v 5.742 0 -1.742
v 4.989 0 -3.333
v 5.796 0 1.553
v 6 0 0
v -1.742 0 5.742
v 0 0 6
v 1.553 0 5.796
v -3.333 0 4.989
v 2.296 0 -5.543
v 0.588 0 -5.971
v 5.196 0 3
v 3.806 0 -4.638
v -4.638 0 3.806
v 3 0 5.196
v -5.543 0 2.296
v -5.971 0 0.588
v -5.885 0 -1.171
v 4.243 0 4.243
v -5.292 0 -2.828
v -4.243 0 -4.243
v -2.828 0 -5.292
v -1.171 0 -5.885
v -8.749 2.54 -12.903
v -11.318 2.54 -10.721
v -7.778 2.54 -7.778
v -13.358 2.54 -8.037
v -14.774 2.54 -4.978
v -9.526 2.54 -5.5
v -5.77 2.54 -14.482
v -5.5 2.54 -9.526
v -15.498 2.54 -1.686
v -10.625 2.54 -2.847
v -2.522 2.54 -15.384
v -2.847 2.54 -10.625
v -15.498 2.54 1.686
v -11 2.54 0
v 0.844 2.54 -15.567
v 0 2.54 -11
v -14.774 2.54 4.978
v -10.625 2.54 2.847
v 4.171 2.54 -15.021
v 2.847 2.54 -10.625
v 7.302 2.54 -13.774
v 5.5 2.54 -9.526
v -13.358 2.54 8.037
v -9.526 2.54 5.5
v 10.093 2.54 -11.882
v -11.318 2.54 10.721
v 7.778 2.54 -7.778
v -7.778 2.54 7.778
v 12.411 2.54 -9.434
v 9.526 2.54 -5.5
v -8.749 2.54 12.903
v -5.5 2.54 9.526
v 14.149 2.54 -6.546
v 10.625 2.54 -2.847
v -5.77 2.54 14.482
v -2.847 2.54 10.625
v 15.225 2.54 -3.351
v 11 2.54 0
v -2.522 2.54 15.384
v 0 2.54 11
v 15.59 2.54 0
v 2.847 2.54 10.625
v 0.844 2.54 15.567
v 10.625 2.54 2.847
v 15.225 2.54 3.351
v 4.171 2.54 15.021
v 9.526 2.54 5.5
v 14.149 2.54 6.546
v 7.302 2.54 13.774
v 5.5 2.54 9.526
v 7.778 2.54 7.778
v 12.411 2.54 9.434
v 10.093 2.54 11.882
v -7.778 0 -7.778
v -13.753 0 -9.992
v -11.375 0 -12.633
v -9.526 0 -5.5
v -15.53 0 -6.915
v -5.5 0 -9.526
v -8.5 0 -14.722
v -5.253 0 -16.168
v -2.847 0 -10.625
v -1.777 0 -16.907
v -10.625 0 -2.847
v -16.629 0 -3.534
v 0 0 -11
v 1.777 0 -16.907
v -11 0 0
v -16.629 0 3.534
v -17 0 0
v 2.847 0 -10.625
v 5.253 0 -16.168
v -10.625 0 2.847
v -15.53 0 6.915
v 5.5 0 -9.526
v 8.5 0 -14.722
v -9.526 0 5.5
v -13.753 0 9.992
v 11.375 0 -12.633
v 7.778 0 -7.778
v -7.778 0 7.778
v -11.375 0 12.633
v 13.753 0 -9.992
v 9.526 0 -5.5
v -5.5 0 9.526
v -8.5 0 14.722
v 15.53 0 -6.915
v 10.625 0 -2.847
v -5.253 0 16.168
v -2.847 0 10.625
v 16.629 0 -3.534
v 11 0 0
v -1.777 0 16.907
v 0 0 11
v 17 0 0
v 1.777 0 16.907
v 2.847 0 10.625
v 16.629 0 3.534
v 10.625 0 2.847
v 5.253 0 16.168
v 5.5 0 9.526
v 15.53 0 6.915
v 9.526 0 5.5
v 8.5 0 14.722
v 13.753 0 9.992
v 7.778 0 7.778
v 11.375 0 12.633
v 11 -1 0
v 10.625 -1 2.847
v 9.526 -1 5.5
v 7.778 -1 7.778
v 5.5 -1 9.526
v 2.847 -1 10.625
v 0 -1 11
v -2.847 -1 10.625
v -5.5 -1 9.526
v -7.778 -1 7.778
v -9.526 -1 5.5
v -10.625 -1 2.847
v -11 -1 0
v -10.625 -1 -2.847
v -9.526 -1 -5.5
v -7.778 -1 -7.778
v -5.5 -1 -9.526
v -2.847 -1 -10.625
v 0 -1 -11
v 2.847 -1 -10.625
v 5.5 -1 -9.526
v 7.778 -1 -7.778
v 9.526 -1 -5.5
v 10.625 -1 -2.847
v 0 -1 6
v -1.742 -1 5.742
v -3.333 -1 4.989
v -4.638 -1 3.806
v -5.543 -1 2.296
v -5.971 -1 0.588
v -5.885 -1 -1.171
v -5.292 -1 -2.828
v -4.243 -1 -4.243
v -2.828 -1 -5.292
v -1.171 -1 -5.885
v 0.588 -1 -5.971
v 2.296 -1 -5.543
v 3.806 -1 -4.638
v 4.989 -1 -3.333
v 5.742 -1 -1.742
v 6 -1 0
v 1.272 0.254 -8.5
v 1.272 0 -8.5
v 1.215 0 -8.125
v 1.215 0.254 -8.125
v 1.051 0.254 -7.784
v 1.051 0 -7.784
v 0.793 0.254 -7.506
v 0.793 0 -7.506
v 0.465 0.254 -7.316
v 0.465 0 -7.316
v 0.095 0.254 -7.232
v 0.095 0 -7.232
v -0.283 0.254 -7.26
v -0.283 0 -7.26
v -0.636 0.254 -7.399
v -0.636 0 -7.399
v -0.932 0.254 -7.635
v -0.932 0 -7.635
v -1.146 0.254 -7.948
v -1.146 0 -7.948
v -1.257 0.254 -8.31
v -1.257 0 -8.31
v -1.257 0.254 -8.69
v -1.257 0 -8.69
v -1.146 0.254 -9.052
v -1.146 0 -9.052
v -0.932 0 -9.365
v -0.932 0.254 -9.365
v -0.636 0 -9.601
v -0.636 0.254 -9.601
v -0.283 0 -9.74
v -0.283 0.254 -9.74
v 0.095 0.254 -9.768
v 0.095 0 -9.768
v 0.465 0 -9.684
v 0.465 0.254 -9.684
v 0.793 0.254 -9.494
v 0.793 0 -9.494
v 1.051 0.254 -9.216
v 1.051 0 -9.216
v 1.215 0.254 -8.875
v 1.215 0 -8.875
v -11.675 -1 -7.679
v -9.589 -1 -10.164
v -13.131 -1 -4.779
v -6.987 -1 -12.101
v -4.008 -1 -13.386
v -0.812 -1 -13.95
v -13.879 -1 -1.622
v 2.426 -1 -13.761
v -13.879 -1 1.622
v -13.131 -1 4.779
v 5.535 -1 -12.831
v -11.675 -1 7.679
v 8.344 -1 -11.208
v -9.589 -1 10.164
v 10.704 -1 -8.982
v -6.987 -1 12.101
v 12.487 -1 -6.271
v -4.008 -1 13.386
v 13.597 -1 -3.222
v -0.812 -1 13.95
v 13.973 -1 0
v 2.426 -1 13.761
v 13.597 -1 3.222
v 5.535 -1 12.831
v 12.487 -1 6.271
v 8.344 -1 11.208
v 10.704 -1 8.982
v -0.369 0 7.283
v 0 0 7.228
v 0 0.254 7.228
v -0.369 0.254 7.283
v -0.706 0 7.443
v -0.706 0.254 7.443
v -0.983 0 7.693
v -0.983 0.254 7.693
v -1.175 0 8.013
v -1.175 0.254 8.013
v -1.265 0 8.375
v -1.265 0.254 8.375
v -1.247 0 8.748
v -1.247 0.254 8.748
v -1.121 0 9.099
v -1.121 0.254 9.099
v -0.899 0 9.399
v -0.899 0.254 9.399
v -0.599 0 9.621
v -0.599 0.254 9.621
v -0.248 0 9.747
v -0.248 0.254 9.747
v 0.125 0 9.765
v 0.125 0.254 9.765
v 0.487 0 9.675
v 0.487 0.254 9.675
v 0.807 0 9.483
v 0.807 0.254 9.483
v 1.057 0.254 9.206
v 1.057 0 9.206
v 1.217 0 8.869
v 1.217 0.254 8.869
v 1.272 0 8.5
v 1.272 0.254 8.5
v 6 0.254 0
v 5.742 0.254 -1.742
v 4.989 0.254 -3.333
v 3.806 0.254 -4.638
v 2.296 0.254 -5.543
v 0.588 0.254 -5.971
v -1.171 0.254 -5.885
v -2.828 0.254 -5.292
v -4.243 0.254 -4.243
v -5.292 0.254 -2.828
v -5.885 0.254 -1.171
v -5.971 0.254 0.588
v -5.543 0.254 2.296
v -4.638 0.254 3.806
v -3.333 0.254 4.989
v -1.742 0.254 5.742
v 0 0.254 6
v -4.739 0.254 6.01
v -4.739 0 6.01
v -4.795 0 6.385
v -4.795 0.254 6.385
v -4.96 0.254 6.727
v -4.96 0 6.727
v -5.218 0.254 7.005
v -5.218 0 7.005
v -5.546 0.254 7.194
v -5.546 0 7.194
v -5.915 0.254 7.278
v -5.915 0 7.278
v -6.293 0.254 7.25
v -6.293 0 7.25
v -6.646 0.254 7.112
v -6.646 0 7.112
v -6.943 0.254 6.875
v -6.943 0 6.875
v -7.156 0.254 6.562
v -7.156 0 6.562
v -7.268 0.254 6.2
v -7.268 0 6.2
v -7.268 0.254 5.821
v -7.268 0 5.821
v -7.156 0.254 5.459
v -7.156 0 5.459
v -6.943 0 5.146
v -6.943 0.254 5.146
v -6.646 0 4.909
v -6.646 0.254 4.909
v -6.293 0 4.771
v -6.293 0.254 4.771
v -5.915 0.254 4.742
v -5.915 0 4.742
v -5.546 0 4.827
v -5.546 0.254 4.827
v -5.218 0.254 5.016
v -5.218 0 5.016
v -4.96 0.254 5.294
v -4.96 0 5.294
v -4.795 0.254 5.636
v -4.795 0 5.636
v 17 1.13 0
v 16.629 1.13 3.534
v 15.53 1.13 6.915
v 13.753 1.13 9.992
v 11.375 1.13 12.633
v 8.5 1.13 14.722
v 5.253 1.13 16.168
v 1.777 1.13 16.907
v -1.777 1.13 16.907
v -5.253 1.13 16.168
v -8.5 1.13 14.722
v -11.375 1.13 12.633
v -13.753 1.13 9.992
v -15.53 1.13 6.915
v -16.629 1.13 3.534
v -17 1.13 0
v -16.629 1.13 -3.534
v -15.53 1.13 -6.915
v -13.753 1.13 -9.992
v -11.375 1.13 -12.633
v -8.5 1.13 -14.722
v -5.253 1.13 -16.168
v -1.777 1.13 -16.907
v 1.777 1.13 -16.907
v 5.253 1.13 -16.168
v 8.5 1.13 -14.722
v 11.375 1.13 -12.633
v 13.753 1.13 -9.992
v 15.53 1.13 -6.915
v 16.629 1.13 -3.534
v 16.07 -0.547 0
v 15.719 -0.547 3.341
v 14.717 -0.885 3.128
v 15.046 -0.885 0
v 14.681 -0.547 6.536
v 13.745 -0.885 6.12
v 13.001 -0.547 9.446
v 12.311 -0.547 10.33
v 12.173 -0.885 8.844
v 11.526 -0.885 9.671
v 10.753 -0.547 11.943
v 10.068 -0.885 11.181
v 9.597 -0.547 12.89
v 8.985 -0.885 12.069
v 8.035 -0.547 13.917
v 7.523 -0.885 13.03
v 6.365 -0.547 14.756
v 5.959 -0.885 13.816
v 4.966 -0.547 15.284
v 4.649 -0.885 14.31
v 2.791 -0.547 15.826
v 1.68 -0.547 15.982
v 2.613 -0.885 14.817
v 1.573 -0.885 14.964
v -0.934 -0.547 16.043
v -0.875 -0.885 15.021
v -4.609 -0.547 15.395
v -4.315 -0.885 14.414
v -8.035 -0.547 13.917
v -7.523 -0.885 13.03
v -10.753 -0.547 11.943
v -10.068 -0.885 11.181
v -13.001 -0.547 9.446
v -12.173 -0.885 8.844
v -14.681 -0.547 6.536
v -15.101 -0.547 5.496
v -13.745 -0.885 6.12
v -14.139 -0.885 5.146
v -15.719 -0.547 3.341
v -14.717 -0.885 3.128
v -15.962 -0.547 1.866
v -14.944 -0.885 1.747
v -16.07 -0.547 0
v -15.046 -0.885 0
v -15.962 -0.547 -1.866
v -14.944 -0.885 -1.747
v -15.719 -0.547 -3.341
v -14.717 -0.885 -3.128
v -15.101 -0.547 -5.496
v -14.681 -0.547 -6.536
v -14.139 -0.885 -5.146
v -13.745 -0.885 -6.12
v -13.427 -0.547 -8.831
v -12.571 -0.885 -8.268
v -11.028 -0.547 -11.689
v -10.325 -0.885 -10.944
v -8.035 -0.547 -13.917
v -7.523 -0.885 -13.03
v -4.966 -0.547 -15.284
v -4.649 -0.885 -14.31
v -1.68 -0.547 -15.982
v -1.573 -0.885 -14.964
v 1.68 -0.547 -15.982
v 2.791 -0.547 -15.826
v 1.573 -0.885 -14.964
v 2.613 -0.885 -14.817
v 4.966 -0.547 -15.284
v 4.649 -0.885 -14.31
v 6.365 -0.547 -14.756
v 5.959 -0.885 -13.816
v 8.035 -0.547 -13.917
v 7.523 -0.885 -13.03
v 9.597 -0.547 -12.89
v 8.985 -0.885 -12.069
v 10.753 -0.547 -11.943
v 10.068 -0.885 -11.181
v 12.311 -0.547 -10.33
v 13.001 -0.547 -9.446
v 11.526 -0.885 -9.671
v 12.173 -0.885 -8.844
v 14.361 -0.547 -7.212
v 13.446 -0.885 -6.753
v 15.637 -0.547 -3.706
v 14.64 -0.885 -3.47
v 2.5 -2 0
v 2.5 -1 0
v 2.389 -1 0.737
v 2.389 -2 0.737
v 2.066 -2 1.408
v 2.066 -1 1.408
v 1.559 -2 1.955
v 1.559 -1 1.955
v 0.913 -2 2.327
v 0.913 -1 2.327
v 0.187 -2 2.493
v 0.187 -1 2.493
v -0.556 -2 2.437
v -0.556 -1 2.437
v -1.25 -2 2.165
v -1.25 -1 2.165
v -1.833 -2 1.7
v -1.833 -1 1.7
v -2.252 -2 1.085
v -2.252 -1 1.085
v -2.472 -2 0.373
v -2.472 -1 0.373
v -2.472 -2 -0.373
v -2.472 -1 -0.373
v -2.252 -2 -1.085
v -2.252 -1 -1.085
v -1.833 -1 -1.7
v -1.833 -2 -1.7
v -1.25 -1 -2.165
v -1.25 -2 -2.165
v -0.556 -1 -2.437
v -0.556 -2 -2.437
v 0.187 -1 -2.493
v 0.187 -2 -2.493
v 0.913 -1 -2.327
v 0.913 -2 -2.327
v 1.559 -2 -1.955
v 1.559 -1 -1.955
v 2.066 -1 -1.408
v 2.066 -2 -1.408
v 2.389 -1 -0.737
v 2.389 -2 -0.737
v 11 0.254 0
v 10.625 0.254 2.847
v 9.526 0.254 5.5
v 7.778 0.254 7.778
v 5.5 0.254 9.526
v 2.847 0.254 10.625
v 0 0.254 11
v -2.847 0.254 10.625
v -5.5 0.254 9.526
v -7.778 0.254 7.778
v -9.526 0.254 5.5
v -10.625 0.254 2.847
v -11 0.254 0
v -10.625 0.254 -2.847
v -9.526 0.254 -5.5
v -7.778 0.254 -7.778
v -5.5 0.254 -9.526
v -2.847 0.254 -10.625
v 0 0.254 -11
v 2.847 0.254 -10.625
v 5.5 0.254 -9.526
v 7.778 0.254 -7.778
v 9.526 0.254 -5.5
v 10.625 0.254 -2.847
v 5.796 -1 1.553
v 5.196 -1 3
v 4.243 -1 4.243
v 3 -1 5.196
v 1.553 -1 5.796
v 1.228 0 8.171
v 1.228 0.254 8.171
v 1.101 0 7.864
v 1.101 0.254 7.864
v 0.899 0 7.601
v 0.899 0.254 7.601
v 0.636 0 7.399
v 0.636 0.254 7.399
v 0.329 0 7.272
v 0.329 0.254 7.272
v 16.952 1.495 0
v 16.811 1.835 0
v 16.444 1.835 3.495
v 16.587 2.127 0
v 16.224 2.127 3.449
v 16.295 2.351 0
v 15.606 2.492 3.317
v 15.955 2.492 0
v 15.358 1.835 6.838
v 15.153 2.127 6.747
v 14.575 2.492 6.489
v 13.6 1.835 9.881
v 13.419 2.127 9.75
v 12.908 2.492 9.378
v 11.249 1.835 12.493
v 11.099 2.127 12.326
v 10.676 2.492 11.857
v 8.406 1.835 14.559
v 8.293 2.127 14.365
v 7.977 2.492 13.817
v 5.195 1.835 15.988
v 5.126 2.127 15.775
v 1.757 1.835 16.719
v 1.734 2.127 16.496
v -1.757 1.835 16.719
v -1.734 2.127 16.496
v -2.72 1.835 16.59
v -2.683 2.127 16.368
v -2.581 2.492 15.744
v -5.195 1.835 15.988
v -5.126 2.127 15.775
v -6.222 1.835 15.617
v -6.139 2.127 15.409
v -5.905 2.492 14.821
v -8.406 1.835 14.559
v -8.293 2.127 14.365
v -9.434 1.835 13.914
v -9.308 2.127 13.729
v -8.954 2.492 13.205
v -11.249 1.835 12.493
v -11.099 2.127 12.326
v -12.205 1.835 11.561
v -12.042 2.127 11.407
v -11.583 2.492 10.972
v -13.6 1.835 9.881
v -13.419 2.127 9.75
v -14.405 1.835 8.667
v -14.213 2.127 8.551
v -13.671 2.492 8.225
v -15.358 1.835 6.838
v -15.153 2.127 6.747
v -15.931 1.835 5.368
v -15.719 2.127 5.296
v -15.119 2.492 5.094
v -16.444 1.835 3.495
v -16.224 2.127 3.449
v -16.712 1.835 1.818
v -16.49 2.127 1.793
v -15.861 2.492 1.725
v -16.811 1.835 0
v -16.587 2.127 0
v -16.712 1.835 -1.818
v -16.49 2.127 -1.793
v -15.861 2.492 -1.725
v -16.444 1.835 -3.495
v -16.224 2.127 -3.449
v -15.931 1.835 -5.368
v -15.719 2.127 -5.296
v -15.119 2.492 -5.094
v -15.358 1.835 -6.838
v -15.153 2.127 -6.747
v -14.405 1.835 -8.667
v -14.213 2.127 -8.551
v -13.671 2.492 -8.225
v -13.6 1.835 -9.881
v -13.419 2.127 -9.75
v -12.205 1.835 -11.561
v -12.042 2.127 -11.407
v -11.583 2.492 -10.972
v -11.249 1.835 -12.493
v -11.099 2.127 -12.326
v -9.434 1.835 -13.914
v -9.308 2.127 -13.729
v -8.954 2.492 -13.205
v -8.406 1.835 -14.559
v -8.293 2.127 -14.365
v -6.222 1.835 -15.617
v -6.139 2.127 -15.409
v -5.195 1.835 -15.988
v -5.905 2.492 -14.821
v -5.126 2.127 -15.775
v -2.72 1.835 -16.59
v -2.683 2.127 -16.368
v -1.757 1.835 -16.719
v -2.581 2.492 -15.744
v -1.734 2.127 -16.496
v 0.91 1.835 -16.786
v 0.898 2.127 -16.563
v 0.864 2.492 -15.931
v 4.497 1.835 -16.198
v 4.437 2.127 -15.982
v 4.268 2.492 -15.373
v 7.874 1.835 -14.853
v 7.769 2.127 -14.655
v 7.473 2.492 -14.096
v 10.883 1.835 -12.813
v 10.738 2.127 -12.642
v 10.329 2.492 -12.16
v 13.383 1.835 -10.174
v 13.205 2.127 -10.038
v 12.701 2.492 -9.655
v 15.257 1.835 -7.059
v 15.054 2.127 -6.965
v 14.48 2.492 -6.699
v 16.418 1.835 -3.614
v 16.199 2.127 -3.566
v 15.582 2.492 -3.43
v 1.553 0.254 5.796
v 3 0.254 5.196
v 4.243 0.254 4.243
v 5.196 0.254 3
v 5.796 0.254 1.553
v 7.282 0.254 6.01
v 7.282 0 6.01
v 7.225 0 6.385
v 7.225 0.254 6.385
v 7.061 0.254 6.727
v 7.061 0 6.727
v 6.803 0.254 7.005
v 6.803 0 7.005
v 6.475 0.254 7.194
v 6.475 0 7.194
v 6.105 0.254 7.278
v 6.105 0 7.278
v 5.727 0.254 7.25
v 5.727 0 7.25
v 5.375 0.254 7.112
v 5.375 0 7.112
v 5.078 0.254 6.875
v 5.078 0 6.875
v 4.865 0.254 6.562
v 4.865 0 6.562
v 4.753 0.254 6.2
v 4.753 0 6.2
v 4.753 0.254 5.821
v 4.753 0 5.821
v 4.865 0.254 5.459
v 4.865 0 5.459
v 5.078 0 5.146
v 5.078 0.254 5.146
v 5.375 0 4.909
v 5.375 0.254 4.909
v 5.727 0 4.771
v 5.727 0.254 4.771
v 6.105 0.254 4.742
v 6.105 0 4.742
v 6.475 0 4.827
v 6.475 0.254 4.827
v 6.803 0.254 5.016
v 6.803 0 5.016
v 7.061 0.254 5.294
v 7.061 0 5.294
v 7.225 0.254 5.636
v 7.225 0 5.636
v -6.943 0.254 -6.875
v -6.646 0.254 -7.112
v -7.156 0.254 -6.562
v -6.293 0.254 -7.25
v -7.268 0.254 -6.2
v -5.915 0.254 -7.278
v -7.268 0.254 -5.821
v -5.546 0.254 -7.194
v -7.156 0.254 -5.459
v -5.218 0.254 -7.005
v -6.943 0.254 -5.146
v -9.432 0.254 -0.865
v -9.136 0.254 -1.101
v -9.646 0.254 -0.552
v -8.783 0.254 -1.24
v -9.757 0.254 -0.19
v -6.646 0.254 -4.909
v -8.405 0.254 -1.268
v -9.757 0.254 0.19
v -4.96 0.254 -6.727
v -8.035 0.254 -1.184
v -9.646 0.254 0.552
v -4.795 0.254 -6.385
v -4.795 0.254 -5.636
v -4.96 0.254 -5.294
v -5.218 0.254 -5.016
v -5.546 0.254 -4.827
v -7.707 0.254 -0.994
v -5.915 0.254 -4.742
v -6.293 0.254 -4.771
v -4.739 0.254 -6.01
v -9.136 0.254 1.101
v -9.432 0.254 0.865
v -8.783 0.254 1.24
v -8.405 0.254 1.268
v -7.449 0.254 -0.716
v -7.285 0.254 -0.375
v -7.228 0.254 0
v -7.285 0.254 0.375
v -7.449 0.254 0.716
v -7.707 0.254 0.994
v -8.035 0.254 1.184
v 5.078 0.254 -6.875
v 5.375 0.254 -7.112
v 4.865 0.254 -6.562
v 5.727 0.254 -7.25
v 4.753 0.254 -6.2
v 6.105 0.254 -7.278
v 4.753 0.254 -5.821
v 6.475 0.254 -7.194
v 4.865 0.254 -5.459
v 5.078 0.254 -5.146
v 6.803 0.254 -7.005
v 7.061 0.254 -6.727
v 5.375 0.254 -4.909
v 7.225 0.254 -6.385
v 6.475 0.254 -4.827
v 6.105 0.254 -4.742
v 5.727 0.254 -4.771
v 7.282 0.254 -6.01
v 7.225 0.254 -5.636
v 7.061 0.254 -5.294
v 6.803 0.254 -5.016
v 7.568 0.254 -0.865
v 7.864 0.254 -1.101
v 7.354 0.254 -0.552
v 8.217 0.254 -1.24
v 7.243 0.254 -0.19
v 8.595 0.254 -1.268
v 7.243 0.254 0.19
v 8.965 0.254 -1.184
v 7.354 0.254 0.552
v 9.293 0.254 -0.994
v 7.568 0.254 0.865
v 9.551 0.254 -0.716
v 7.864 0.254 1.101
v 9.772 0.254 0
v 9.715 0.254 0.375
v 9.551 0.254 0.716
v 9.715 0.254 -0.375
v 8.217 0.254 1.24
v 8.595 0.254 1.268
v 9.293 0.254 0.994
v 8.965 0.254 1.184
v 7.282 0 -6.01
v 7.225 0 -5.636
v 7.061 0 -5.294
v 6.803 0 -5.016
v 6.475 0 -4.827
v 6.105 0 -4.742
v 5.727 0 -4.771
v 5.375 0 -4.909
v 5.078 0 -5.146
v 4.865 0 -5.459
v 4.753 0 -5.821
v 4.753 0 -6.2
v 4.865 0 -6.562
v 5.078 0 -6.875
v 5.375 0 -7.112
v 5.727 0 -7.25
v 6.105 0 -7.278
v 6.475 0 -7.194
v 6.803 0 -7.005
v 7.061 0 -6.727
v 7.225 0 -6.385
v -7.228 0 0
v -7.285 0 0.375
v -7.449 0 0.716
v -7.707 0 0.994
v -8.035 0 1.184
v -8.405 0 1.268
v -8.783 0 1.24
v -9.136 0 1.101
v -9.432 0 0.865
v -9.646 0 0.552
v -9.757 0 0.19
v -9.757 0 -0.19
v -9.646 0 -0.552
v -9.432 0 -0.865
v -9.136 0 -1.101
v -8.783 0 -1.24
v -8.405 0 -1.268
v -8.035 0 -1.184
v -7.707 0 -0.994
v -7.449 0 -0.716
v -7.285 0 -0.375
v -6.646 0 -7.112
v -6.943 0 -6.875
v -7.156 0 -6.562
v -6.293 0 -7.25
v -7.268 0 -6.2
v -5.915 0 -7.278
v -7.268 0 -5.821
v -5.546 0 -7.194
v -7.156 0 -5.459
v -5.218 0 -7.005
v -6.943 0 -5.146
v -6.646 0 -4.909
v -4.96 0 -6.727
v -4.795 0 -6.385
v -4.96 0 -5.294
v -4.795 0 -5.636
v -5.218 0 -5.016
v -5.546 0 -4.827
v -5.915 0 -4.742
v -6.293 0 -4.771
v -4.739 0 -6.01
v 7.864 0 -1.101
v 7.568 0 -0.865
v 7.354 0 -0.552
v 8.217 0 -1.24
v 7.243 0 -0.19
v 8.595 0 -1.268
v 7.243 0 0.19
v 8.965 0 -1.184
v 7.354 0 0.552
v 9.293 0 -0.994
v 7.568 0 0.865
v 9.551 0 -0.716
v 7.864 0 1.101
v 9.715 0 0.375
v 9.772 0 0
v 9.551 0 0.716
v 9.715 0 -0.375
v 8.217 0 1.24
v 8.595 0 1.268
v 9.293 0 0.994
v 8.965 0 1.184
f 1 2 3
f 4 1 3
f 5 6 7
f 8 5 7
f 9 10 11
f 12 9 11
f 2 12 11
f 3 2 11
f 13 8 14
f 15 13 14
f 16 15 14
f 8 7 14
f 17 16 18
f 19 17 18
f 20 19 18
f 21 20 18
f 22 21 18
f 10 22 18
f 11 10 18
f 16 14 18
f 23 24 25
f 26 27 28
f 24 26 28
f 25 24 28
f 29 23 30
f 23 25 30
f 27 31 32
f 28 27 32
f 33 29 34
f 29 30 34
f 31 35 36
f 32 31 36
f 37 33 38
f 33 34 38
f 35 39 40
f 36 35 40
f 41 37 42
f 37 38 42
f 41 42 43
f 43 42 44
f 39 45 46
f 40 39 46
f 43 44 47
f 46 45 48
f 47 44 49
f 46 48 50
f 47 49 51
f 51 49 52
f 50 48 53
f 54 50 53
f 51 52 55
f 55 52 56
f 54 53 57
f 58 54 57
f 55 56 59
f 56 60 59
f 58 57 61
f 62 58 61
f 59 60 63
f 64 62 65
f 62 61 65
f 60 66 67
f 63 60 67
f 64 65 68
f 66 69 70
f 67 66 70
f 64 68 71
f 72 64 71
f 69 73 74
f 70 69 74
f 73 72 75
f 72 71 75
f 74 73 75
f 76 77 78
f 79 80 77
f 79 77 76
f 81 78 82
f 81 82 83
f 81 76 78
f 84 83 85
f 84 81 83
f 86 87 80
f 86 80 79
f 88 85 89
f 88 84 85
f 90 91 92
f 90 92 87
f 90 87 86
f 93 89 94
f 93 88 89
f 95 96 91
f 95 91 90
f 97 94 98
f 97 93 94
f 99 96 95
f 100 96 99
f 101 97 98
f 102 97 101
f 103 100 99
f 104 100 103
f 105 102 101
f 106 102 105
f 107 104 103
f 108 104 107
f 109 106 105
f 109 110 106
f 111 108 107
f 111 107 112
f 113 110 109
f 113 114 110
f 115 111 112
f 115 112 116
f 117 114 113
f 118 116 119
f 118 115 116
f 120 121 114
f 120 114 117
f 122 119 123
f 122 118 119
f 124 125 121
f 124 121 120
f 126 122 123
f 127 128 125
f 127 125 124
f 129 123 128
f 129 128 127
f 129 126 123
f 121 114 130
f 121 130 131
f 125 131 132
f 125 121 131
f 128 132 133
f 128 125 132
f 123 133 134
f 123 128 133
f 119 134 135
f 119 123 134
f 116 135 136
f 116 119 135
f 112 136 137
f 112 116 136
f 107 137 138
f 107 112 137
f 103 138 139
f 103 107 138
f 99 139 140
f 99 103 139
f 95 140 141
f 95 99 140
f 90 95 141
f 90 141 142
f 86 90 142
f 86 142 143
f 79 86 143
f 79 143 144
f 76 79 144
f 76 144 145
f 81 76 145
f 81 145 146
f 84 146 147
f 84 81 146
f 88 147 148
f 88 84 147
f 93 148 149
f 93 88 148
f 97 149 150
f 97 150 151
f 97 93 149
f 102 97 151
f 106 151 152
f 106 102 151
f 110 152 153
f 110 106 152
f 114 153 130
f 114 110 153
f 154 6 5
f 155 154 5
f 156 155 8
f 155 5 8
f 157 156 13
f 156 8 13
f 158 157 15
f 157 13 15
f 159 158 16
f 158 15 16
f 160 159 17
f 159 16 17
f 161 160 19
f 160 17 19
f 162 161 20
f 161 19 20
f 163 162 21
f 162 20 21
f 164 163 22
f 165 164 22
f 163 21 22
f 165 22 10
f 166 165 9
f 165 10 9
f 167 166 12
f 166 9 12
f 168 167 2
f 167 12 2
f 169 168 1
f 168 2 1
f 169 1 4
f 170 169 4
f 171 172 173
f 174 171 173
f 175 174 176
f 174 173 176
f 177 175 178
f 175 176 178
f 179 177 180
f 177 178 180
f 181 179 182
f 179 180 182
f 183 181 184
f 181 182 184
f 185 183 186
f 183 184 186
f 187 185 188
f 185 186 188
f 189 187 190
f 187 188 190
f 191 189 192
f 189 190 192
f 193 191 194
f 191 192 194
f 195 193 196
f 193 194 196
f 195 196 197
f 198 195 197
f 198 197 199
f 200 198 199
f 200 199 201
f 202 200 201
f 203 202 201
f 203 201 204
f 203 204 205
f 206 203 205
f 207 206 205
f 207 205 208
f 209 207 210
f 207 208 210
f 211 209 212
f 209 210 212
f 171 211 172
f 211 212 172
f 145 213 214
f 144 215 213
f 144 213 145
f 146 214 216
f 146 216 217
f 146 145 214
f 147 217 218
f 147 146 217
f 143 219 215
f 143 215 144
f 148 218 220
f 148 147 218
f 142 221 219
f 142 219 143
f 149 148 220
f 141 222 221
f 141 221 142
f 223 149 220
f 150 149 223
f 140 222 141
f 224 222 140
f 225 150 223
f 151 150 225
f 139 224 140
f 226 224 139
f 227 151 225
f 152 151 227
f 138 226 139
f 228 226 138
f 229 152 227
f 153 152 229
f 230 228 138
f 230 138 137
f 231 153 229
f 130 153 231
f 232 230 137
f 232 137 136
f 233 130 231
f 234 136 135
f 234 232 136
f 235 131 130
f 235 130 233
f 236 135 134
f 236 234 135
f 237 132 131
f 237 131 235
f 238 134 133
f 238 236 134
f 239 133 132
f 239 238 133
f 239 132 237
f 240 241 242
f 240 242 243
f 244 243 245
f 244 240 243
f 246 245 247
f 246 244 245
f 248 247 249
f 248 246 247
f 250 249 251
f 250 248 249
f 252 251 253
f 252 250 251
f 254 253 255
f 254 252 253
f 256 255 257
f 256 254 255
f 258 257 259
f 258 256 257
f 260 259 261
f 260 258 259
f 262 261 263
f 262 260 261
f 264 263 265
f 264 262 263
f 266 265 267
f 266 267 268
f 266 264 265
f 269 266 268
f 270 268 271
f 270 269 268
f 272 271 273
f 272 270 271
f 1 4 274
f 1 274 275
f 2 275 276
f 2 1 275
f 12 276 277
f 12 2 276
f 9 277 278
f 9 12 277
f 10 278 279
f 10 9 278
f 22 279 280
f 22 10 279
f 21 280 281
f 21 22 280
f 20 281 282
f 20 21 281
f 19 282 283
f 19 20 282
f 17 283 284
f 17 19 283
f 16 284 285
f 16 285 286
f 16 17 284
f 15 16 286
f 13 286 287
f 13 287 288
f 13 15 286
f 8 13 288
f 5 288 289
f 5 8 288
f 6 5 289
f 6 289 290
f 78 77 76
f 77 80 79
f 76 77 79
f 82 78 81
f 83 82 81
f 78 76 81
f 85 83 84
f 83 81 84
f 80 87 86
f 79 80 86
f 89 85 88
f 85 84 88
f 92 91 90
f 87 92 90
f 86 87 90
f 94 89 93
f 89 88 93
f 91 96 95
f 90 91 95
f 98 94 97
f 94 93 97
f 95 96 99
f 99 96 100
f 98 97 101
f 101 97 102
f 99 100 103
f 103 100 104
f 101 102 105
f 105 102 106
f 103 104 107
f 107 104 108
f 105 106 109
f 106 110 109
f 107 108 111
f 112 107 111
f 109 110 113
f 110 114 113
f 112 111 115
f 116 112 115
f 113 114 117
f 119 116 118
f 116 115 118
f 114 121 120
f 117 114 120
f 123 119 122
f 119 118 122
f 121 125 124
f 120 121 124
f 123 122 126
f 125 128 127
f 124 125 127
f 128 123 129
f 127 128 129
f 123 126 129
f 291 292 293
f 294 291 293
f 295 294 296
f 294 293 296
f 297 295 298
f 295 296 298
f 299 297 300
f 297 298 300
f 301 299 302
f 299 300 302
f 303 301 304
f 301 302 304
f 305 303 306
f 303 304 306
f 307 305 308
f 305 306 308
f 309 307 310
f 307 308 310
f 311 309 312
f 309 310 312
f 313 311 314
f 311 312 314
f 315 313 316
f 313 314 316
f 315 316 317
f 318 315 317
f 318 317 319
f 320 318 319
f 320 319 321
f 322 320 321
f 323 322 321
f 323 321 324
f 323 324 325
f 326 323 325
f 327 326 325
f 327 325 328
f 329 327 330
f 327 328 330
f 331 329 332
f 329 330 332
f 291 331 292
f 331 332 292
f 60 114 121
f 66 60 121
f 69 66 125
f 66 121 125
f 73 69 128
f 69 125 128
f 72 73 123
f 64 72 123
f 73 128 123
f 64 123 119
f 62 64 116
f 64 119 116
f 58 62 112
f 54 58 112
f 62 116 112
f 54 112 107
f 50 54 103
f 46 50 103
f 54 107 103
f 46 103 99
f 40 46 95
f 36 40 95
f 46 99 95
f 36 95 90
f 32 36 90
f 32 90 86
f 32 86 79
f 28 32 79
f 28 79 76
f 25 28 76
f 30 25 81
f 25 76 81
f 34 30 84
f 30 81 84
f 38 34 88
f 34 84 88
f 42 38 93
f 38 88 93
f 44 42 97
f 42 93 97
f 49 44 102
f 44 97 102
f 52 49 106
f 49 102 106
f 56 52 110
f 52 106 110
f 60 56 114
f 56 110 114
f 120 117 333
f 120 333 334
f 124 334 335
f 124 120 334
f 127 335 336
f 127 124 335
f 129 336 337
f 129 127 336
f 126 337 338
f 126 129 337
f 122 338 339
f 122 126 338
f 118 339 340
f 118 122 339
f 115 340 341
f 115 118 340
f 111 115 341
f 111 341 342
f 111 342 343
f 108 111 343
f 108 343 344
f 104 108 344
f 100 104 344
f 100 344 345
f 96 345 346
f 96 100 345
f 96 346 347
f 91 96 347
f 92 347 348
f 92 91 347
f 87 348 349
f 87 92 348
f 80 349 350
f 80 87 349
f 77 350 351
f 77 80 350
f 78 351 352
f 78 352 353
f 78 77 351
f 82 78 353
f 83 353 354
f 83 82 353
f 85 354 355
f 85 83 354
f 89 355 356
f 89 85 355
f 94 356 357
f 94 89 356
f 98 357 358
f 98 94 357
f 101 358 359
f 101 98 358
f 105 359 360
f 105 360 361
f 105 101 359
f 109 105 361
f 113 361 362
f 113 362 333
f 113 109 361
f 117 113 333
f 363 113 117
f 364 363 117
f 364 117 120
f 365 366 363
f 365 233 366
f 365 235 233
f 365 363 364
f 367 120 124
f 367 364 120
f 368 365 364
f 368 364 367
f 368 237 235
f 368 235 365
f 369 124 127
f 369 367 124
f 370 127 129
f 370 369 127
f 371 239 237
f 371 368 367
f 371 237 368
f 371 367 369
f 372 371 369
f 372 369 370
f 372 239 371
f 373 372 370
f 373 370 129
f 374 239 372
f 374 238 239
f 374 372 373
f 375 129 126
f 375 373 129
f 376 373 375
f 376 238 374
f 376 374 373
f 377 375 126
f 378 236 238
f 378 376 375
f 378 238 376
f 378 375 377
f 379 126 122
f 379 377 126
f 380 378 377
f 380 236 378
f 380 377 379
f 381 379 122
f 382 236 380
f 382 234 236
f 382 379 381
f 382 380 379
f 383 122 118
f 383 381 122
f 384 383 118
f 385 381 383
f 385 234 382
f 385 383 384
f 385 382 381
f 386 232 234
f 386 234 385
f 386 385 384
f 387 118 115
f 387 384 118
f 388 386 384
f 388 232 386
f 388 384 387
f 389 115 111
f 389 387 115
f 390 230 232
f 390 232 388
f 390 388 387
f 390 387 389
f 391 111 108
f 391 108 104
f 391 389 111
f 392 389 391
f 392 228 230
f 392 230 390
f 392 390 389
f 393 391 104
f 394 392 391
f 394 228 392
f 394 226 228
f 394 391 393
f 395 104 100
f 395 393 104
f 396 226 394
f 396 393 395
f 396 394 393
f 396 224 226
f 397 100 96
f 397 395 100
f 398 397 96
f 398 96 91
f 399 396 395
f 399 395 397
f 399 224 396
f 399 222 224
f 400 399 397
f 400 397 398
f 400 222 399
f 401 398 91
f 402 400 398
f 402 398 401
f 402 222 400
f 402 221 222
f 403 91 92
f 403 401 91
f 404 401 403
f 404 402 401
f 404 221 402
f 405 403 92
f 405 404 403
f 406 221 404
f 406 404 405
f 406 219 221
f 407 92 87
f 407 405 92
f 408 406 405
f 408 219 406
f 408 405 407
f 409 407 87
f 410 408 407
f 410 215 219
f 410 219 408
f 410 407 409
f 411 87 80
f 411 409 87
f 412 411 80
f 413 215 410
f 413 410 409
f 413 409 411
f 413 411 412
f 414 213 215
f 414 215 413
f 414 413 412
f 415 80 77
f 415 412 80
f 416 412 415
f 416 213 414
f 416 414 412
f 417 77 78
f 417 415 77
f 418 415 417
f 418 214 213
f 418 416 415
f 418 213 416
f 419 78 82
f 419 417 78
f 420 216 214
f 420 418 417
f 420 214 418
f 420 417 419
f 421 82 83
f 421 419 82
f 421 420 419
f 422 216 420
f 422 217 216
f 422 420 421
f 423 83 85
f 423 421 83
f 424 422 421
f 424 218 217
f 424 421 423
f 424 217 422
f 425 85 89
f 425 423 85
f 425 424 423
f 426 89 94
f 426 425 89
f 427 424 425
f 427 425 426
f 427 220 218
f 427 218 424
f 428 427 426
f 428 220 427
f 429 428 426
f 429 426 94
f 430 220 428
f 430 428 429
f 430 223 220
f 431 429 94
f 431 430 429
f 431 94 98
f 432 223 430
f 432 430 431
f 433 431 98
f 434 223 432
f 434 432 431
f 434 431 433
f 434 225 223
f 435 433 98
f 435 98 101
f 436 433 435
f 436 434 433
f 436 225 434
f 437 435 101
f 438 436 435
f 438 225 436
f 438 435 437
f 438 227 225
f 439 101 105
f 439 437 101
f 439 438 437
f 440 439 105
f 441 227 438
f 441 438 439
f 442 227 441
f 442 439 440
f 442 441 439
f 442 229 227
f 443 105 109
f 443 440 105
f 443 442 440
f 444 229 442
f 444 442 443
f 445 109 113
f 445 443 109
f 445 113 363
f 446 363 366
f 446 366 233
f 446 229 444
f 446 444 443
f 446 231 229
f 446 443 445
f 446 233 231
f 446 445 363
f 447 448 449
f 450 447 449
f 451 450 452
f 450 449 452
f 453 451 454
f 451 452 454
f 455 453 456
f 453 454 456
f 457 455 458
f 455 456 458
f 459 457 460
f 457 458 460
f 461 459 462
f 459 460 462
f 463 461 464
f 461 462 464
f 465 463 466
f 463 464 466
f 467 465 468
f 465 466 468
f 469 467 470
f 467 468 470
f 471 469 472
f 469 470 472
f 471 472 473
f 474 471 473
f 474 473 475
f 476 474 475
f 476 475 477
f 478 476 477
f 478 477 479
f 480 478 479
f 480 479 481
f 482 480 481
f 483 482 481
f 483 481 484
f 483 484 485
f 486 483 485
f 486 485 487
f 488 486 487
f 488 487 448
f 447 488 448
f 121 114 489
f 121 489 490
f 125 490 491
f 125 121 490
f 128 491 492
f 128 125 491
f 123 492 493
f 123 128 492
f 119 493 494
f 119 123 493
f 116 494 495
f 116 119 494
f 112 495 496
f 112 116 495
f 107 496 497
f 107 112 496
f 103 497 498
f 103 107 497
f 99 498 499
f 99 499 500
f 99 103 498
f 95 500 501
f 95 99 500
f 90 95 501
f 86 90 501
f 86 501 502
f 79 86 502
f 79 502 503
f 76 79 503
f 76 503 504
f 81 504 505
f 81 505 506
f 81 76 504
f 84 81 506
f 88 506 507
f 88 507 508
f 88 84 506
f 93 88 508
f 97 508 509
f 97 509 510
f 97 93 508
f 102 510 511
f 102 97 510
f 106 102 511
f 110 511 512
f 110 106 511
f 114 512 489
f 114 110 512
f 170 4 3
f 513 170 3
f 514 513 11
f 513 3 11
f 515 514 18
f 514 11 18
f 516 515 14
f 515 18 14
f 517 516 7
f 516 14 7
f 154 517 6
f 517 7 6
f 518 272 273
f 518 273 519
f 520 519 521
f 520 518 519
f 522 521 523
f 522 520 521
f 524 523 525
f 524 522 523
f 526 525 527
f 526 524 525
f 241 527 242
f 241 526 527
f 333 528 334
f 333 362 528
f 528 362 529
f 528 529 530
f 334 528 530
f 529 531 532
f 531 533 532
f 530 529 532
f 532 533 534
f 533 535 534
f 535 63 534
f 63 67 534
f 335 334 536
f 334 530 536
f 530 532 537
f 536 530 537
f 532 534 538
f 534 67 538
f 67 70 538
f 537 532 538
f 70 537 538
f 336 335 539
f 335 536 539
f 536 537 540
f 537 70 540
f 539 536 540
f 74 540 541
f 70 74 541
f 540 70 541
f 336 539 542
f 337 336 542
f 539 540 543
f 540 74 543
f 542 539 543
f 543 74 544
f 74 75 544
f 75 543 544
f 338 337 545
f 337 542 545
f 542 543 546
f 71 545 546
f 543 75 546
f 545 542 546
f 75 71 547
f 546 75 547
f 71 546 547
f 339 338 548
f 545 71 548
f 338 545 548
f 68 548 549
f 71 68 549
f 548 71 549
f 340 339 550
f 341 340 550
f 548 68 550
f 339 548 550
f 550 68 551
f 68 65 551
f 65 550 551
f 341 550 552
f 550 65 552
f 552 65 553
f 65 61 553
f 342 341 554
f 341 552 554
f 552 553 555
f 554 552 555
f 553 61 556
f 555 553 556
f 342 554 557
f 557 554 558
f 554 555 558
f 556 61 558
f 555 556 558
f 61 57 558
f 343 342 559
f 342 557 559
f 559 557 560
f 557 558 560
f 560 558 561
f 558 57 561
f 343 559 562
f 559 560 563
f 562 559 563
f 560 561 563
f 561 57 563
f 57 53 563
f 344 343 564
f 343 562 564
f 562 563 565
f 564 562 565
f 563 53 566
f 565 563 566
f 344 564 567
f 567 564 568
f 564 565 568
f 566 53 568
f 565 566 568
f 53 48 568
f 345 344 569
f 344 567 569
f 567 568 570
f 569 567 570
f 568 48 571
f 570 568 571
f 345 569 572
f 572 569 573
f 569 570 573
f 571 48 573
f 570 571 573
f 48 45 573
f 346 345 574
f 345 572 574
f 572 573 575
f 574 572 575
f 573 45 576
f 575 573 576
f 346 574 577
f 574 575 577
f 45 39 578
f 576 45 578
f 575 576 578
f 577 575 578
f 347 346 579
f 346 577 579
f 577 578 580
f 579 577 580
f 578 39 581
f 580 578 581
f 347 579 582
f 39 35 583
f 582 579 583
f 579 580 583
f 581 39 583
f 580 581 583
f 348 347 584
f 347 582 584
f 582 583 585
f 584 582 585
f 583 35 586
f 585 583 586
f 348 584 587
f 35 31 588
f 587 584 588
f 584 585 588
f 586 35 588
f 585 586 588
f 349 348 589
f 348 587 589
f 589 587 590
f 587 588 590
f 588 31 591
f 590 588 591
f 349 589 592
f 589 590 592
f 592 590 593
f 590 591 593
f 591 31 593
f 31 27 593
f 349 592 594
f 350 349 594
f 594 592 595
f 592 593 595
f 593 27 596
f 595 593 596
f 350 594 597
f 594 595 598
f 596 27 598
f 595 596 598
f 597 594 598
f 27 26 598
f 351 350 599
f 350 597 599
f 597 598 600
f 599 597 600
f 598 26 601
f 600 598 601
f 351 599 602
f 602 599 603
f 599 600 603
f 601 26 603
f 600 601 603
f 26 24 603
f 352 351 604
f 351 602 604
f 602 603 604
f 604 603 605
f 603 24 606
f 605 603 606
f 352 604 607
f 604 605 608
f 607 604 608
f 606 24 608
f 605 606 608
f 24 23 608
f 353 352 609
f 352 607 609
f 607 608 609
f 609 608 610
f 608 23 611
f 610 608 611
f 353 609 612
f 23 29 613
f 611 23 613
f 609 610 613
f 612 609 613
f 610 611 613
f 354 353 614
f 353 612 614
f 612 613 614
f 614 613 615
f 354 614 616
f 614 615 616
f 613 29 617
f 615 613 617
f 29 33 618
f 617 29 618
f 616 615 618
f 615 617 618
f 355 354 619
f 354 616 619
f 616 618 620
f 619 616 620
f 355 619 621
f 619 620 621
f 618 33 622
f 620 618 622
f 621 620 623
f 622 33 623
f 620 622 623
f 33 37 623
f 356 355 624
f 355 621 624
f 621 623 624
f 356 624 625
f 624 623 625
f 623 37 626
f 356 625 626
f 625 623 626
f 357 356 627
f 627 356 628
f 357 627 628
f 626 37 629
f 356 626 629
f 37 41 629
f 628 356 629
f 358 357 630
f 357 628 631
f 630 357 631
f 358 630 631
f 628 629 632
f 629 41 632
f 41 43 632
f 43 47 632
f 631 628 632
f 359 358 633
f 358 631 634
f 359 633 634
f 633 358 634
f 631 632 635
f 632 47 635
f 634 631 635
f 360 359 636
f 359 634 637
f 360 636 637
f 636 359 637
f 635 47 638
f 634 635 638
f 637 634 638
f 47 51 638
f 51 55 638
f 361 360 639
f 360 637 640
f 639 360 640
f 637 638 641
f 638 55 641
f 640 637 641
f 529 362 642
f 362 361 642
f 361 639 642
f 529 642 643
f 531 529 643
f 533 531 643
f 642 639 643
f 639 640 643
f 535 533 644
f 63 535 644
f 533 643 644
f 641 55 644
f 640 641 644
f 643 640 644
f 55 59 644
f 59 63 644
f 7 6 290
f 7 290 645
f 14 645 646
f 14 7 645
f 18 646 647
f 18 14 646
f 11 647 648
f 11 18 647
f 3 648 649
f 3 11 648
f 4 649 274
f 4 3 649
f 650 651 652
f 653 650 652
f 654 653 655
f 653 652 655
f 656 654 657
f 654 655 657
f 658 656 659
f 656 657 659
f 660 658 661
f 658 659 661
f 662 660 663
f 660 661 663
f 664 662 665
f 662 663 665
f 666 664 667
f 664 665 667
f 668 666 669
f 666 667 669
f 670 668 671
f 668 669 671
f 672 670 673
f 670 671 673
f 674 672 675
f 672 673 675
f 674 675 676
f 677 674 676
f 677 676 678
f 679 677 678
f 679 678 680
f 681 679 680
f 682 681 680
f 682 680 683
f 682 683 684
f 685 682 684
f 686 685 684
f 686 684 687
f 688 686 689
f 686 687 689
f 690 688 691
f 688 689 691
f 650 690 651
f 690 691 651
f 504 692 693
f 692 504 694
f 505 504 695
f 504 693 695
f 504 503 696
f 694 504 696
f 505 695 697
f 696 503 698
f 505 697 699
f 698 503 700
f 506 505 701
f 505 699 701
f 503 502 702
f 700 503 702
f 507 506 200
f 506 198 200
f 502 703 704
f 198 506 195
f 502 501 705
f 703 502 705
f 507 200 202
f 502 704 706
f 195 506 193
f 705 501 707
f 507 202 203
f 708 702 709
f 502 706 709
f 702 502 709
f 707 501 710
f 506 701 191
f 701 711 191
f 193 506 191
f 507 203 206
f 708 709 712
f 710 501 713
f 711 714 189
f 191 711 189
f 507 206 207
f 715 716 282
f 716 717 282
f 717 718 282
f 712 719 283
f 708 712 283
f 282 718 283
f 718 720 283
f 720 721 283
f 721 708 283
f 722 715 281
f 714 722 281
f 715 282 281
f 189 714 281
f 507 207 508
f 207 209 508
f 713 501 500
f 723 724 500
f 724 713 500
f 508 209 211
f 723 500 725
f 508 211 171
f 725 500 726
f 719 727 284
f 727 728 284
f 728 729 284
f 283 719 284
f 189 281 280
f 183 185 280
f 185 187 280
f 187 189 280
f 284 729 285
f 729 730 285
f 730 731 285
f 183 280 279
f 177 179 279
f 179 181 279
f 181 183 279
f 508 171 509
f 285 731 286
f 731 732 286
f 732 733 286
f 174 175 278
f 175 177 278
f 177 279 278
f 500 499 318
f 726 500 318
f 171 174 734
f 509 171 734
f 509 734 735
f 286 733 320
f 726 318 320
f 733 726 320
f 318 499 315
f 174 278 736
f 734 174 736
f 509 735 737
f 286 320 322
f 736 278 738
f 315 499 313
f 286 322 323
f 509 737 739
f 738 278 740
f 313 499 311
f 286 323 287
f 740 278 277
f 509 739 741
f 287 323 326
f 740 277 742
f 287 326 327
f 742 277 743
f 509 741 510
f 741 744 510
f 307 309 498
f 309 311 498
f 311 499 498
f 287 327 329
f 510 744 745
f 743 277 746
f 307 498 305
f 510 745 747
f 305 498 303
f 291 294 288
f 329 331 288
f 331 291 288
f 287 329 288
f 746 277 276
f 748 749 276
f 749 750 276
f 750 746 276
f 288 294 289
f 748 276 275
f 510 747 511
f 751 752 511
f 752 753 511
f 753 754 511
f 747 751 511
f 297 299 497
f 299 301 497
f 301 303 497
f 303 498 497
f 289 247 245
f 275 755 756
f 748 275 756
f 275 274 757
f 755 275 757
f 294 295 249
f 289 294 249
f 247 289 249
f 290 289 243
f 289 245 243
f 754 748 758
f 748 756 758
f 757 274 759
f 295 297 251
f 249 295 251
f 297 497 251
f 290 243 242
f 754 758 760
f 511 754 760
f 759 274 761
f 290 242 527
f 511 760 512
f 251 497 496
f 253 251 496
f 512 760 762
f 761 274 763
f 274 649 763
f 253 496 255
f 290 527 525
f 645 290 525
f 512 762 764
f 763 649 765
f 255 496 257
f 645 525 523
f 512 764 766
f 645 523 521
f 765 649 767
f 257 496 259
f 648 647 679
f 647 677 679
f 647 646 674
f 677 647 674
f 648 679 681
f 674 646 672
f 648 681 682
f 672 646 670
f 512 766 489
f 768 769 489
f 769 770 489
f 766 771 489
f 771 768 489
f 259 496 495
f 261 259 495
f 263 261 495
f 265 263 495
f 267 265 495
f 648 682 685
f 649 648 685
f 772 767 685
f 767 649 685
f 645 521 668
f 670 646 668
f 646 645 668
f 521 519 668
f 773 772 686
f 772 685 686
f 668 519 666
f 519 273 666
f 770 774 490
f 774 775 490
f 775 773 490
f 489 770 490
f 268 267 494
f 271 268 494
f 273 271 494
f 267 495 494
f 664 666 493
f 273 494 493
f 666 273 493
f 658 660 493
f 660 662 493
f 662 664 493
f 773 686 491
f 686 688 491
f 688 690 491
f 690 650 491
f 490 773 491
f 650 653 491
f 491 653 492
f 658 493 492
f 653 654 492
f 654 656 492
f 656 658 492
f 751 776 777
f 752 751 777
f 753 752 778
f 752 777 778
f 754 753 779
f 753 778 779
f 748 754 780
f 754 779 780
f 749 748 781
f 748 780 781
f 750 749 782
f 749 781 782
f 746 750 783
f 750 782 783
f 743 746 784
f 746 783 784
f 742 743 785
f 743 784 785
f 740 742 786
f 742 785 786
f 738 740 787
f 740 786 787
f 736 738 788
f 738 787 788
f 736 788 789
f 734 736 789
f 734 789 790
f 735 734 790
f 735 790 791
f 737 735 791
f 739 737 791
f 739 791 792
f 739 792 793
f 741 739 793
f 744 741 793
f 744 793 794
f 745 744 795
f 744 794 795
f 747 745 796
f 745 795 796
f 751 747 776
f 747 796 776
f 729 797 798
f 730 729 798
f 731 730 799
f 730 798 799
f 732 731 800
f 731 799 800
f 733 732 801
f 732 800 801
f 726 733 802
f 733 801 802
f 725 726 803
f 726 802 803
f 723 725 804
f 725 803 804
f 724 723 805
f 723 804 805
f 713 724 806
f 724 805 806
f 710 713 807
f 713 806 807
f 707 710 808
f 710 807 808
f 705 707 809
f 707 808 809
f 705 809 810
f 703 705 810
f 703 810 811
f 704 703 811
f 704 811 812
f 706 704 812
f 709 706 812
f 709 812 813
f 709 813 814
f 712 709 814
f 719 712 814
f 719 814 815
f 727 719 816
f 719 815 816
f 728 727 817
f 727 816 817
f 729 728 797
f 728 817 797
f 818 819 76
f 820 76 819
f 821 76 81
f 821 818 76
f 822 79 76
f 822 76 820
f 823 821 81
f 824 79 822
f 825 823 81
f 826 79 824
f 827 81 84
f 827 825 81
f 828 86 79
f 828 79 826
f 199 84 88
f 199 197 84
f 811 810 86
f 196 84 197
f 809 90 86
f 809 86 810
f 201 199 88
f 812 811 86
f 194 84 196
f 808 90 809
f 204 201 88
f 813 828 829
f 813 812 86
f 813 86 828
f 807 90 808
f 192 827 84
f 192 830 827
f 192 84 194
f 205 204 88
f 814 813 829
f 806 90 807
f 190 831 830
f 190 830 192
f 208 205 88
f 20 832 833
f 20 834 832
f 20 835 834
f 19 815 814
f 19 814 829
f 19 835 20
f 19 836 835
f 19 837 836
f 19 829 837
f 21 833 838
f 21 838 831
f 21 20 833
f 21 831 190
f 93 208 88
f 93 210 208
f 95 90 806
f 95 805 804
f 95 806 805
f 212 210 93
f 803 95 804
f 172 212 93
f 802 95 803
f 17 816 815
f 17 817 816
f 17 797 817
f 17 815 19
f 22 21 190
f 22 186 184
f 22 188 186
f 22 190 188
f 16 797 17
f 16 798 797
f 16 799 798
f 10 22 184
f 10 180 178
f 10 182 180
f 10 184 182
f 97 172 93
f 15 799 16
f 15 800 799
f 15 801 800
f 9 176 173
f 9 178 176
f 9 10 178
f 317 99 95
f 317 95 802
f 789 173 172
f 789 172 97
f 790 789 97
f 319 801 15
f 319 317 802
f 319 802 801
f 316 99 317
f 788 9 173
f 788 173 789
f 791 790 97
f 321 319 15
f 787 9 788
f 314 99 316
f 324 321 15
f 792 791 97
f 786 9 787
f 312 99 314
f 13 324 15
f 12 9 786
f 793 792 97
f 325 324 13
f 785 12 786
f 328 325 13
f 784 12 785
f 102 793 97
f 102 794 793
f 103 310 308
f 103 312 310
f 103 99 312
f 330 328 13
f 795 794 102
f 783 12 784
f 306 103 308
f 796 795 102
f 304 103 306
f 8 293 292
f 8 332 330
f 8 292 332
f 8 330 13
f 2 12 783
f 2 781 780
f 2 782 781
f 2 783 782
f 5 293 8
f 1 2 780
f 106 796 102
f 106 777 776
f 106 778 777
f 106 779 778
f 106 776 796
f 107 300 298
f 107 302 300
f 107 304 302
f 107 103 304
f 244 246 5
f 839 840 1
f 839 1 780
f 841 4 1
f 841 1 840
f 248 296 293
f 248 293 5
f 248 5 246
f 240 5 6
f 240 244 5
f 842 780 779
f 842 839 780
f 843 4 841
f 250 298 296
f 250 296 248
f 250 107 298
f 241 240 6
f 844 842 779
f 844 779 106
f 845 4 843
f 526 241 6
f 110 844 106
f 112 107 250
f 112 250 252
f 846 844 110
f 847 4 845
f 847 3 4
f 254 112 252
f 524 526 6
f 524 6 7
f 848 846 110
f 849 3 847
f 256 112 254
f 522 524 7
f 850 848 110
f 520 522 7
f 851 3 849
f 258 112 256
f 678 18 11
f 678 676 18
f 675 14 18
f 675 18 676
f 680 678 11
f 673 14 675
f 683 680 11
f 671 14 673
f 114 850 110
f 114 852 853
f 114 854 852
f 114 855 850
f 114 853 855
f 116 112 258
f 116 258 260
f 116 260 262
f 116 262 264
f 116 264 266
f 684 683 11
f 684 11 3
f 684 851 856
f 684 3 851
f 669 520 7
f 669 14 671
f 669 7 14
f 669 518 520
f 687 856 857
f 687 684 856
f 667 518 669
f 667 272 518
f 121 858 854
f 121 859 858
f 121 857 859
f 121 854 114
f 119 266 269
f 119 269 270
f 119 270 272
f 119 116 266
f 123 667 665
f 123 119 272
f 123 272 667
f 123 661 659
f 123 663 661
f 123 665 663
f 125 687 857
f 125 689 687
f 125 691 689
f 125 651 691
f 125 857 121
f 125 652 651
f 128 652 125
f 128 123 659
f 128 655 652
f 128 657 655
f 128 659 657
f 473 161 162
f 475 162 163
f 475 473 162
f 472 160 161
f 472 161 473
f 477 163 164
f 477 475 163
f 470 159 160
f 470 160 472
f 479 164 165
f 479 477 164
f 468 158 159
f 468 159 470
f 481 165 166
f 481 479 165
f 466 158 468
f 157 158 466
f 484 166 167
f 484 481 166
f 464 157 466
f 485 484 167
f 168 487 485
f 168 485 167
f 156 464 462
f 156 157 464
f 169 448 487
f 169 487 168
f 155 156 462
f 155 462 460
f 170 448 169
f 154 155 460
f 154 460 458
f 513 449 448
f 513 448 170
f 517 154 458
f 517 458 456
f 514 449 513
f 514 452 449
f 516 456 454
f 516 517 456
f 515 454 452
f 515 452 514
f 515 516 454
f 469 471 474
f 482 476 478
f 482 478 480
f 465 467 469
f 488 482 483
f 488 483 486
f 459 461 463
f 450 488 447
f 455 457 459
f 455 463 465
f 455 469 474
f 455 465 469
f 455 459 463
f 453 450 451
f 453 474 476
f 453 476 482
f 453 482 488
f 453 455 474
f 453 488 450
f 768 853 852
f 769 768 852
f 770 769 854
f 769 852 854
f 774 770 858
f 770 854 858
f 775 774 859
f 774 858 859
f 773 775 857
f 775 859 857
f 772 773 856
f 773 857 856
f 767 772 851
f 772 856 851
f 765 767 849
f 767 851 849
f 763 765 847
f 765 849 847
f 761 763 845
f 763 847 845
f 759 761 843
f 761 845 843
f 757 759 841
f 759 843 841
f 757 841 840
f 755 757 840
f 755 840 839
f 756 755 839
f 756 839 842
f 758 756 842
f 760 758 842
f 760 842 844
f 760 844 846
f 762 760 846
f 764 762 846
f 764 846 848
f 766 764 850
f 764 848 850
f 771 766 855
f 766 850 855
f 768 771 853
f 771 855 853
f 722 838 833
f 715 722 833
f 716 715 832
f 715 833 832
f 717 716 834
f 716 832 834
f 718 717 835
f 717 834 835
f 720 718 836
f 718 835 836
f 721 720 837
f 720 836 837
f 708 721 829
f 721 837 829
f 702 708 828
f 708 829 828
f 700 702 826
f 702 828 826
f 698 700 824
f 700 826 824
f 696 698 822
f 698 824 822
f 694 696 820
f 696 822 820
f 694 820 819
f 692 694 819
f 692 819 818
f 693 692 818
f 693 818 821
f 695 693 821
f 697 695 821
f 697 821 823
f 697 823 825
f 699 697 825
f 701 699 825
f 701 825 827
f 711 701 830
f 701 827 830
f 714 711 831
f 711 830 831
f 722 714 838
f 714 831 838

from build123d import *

# Parameters (mm, degrees)
F1_R     = 17
F1_R_2   = 11
F2_DEPTH = 1
F1_R_3   = 2.5
F3_DEPTH = 2
F1_R_4   = 1.2715293898
F4_DEPTH = 0.254
F6_DEPTH = 2.54
F7_R     = 1.4103835631


# Not quite as in the source:
# - a fillet or chamfer that OpenCascade refuses, or shapes differently, is made with other operations: its cross-section is extruded or revolved along the edge and cut away or added


with BuildPart() as f2:
    # F1 (on face) → F2 (new body)
    with BuildSketch(Plane.XZ):
        Circle(F1_R)
        Circle(F1_R_2, mode=Mode.SUBTRACT)
    extrude(amount=F2_DEPTH)

    # F5: fillet of radius 5.08 on 1 edges, made by hand

    # F5_s1 → F5_t2 (revolve, cut)
    with BuildSketch(Plane.XY):
        with BuildLine():
            ThreePointArc((17, 0), (15.567188555, -0.7435256815), (13.9734508099, -1))
            Line((13.9734508099, -1), (17, -1))
            Line((17, -1), (17, 0))
        make_face()
    revolve(axis=Axis((0, -1, 0), (0, -1, 0)), mode=Mode.SUBTRACT)


with BuildPart() as f2b:
    # F1 (on face) → F2, piece 2 (new body)
    with BuildSketch(Plane.XZ):
        with BuildLine():
            ThreePointArc((0, 6), (-4.2426406871, -4.2426406871), (6, 0))
            ThreePointArc((6, 0), (4.2426406871, 4.2426406871), (0, 6))
        make_face()
        Circle(F1_R_3, mode=Mode.SUBTRACT)
    extrude(amount=F2_DEPTH)

    # F1 (on face) → F3 (join)
    with BuildSketch(Plane.XZ):
        Circle(F1_R_3)
    extrude(amount=F3_DEPTH)


with BuildPart() as f4:
    # F1 (on face) → F4 (new body)
    with BuildSketch(Plane.XZ):
        Circle(F1_R_2)
        with Locations((-6.0104076401, -6.0104076401)):
            Circle(F1_R_4, mode=Mode.SUBTRACT)
        with Locations((0, -8.5)):
            Circle(F1_R_4, mode=Mode.SUBTRACT)
        with Locations((6.0104076401, -6.0104076401)):
            Circle(F1_R_4, mode=Mode.SUBTRACT)
        with Locations((-8.5, 0)):
            Circle(F1_R_4, mode=Mode.SUBTRACT)
        with Locations((-6.0104076401, 6.0104076401)):
            Circle(F1_R_4, mode=Mode.SUBTRACT)
        with BuildLine():
            ThreePointArc((0, 6), (4.2426406871, 4.2426406871), (6, 0))
            ThreePointArc((6, 0), (-4.2426406871, -4.2426406871), (0, 6))
        make_face(mode=Mode.SUBTRACT)
        with Locations((8.5, 0)):
            Circle(F1_R_4, mode=Mode.SUBTRACT)
        with BuildLine():
            ThreePointArc((1.2715293898, 8.5), (0.899107054, 7.600892946), (0, 7.2284706102))
            ThreePointArc((0, 7.2284706102), (-0.899107054, 9.399107054), (1.2715293898, 8.5))
        make_face(mode=Mode.SUBTRACT)
        with Locations((6.0104076401, 6.0104076401)):
            Circle(F1_R_4, mode=Mode.SUBTRACT)
    extrude(amount=-F4_DEPTH)


with BuildPart() as f6:
    # F1 (on face) → F6 (new body)
    with BuildSketch(Plane.XZ):
        Circle(F1_R)
        Circle(F1_R_2, mode=Mode.SUBTRACT)
    extrude(amount=-F6_DEPTH)

    # F7
    f7_edges = [f6.edges().sort_by_distance(p)[0] for p in [
        (-17, 2.54, 0),
    ]]
    fillet(f7_edges, radius=F7_R)


solid = Compound([f2.part, f2b.part, f4.part, f6.part])
